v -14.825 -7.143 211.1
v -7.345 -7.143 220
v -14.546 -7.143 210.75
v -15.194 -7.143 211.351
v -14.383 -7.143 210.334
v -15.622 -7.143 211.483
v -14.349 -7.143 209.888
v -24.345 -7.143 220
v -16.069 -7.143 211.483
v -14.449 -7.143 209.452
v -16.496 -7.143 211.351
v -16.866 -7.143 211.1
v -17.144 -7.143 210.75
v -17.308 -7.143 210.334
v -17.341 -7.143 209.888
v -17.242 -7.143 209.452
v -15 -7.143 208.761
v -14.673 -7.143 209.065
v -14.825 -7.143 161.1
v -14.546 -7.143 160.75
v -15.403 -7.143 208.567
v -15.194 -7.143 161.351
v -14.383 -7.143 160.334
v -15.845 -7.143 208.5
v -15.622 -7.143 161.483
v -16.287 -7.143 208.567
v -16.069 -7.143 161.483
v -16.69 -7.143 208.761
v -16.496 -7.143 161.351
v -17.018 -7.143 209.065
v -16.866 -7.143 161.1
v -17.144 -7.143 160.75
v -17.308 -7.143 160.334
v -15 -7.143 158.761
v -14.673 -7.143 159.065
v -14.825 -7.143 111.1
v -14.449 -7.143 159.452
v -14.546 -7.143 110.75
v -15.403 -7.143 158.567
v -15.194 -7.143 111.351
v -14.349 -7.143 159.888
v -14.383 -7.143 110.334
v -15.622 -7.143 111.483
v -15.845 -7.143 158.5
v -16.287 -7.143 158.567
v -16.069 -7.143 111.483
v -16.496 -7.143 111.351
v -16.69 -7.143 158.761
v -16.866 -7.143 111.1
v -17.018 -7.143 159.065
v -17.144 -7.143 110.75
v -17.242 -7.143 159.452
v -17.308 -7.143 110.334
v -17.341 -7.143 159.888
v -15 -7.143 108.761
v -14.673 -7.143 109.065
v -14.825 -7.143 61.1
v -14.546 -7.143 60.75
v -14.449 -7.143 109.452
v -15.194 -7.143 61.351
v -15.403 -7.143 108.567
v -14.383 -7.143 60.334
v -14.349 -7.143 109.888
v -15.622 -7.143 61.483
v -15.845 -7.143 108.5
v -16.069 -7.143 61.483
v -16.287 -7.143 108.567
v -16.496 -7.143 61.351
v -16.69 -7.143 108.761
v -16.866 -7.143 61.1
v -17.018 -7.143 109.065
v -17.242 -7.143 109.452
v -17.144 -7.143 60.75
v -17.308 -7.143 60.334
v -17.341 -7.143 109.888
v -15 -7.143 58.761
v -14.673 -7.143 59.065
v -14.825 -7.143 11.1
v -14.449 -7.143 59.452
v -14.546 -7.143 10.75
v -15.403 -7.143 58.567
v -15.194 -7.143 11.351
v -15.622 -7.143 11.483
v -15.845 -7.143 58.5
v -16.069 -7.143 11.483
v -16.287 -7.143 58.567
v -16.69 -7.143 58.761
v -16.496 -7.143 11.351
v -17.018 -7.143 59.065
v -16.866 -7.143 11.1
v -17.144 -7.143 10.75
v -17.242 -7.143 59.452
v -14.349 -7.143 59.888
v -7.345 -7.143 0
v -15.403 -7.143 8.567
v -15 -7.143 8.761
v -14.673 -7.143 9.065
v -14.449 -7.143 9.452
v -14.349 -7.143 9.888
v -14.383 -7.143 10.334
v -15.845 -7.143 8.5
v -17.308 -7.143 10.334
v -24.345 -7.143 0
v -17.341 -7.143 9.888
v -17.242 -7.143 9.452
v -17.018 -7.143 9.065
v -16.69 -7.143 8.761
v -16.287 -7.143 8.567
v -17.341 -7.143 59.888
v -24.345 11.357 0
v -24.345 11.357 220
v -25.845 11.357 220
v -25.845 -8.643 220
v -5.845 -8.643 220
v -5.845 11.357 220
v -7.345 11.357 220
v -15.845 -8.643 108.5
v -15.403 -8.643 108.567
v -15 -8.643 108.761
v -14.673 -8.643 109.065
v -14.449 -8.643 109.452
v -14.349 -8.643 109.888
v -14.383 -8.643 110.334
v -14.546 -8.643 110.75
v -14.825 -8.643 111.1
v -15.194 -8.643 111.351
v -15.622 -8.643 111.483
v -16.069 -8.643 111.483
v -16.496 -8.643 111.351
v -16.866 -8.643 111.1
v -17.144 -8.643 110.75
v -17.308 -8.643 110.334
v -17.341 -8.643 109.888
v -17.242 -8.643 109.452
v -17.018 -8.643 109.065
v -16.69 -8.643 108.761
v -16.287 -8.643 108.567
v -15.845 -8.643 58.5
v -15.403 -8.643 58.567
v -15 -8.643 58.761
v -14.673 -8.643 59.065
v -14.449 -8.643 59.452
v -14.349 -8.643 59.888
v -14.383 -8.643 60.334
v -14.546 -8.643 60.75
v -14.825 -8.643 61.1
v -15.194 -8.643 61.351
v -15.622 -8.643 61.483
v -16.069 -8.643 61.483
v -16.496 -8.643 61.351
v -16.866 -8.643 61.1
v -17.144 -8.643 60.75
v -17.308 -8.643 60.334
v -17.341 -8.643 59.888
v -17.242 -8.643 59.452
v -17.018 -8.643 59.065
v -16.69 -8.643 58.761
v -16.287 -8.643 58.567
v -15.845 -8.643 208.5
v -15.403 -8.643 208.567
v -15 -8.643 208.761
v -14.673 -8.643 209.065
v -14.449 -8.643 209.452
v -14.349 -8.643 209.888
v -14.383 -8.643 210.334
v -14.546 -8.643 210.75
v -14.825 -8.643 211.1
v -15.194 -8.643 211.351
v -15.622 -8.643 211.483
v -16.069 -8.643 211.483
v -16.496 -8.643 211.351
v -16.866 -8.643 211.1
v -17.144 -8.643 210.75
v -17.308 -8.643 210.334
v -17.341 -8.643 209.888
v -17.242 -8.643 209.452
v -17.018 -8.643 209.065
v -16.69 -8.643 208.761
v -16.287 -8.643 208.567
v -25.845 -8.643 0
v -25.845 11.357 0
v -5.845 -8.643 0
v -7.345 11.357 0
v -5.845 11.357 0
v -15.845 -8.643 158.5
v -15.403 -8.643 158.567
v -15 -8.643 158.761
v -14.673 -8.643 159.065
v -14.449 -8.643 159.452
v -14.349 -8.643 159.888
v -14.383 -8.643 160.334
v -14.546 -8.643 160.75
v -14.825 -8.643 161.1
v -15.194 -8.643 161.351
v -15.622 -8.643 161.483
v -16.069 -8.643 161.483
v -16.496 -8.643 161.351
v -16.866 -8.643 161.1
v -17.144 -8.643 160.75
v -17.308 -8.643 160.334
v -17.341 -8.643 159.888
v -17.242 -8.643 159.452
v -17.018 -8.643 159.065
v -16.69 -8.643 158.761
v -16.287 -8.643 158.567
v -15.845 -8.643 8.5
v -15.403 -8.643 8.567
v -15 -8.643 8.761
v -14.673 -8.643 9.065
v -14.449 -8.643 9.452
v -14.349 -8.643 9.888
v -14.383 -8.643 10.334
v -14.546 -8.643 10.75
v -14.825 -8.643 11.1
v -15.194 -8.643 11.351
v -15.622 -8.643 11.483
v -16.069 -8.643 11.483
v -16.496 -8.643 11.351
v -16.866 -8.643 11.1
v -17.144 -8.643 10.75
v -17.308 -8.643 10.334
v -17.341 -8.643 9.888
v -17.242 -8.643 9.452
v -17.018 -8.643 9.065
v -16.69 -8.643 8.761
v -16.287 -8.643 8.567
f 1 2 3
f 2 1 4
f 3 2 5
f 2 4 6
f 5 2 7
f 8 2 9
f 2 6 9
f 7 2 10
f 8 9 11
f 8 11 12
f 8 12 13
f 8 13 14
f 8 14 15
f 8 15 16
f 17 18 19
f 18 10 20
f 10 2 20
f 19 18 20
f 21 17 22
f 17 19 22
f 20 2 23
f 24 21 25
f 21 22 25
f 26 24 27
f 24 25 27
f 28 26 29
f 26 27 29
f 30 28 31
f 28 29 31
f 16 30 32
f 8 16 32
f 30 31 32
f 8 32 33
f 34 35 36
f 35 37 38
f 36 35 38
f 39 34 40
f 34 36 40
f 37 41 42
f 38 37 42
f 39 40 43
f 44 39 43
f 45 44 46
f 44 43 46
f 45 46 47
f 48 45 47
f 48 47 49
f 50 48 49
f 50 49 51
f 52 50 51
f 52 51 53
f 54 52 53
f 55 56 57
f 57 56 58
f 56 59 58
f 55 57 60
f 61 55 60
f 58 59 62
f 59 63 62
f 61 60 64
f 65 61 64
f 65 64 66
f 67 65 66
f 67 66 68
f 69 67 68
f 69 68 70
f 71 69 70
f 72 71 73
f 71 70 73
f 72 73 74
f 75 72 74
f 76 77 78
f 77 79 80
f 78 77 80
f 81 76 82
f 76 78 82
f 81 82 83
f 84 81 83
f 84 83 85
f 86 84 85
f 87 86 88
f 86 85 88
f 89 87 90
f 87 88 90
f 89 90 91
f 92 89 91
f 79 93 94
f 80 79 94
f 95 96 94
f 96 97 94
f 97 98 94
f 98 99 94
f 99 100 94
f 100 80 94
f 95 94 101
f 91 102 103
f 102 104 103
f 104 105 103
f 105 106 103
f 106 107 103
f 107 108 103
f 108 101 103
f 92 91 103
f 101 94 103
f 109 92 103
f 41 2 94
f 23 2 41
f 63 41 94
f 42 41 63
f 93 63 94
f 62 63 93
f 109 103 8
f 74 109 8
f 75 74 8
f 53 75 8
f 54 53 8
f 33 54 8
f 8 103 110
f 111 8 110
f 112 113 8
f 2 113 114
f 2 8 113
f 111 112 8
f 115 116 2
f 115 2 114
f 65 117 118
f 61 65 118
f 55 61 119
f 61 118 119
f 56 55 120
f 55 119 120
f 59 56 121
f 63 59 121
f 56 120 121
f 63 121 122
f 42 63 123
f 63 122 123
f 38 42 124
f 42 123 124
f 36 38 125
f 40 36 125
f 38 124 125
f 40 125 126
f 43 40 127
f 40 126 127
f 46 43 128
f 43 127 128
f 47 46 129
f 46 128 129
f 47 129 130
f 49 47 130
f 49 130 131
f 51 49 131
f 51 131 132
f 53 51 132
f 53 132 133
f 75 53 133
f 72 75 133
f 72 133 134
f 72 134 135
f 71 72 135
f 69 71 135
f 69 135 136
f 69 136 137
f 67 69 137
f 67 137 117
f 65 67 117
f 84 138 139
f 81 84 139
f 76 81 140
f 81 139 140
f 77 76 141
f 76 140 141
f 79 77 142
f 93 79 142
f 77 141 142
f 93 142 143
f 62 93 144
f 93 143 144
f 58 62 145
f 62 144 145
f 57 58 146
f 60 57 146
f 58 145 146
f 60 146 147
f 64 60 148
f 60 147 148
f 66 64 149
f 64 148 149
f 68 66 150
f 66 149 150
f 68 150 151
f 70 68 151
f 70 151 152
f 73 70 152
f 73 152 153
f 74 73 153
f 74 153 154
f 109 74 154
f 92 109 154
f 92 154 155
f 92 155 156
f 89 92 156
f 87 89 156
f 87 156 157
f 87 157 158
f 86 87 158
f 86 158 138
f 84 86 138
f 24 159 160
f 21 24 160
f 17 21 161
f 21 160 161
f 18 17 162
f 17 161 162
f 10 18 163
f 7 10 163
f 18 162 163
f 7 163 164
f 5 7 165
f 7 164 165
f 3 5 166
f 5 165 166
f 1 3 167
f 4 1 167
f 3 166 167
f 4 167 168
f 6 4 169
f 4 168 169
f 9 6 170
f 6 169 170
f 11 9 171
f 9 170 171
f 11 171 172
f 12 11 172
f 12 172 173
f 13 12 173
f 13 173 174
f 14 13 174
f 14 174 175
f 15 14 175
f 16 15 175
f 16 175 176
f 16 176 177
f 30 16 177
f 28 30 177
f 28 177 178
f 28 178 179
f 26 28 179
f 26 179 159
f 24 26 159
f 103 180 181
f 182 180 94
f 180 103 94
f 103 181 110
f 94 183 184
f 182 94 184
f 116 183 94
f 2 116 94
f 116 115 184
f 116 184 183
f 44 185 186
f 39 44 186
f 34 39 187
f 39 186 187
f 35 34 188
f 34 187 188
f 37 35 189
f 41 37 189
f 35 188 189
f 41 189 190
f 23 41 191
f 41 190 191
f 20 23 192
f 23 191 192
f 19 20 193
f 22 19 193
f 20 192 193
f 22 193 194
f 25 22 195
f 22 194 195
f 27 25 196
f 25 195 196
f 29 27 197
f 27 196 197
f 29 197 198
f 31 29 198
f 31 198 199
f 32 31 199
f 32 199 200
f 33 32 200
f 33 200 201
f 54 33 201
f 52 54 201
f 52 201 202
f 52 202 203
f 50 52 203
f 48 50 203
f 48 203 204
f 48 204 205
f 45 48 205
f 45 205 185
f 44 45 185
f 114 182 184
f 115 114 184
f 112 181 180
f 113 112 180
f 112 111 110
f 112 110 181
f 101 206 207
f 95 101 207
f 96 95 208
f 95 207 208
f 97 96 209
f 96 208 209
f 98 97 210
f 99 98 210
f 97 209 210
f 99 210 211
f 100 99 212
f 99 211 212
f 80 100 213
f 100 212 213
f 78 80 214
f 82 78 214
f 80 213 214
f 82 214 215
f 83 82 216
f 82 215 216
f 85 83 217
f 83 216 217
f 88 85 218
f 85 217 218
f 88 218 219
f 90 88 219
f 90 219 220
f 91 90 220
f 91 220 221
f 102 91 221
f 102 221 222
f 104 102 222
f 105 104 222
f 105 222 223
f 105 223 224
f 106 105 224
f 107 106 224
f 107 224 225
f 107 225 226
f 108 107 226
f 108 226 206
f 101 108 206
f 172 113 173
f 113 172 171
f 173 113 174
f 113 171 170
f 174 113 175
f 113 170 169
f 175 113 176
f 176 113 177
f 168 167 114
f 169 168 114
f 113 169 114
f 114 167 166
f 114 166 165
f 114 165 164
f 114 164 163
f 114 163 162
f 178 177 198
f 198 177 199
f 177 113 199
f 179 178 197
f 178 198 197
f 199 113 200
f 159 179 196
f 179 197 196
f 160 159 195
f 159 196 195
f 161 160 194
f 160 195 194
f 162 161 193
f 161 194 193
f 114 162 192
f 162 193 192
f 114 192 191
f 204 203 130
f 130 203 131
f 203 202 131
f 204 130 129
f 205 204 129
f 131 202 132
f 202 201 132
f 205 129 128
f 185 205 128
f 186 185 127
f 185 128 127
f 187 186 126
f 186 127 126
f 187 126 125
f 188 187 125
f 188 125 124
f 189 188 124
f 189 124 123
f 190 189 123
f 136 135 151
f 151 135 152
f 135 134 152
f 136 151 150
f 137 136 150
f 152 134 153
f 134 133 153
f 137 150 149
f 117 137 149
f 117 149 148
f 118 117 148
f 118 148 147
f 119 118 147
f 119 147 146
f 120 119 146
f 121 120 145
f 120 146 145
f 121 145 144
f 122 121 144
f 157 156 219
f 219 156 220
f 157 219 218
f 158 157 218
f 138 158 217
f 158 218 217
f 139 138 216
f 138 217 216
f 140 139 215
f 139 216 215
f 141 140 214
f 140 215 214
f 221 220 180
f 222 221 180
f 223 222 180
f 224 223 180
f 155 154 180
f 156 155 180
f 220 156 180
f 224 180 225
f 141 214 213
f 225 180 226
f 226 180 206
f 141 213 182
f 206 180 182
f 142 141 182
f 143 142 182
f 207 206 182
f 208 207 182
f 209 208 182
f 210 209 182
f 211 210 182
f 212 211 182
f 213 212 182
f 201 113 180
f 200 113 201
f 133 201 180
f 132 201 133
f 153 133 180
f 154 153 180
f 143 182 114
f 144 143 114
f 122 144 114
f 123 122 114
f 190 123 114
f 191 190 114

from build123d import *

# Parameters (mm, degrees)
EXTRUSION1_DEPTH = 220
ESQUISSE2_R      = 1.5
EXTRUSION2_DEPTH = 200


with BuildPart() as part:
    # Esquisse1 → Extrusion1 (new body)
    with BuildSketch(Plane.XY):
        Polygon((-25.845256994, 11.357120085), (-25.845256994, -8.642879915), (-5.845256994, -8.642879915), (-5.845256994, 11.357120085), (-7.345256994, 11.357120085), (-7.345256994, -7.142879915), (-24.345256994, -7.142879915), (-24.345256994, 11.357120085), align=None)
    extrude(amount=EXTRUSION1_DEPTH)

    # Esquisse2 → Extrusion2 (cut)
    with BuildSketch(Plane.XZ.offset(8.642879915)):
        with Locations(Location((-15.845256994, 210, 0), (0, 0, 270))):
            Circle(ESQUISSE2_R)
        with Locations(Location((-15.845256994, 10, 0), (0, 0, 270))):
            Circle(ESQUISSE2_R)
        with Locations(Location((-15.845256994, 160, 0), (0, 0, 270))):
            Circle(ESQUISSE2_R)
        with Locations(Location((-15.845256994, 110, 0), (0, 0, 270))):
            Circle(ESQUISSE2_R)
        with Locations(Location((-15.845256994, 60, 0), (0, 0, 270))):
            Circle(ESQUISSE2_R)
    extrude(amount=-EXTRUSION2_DEPTH, mode=Mode.SUBTRACT)


solid = part.part
